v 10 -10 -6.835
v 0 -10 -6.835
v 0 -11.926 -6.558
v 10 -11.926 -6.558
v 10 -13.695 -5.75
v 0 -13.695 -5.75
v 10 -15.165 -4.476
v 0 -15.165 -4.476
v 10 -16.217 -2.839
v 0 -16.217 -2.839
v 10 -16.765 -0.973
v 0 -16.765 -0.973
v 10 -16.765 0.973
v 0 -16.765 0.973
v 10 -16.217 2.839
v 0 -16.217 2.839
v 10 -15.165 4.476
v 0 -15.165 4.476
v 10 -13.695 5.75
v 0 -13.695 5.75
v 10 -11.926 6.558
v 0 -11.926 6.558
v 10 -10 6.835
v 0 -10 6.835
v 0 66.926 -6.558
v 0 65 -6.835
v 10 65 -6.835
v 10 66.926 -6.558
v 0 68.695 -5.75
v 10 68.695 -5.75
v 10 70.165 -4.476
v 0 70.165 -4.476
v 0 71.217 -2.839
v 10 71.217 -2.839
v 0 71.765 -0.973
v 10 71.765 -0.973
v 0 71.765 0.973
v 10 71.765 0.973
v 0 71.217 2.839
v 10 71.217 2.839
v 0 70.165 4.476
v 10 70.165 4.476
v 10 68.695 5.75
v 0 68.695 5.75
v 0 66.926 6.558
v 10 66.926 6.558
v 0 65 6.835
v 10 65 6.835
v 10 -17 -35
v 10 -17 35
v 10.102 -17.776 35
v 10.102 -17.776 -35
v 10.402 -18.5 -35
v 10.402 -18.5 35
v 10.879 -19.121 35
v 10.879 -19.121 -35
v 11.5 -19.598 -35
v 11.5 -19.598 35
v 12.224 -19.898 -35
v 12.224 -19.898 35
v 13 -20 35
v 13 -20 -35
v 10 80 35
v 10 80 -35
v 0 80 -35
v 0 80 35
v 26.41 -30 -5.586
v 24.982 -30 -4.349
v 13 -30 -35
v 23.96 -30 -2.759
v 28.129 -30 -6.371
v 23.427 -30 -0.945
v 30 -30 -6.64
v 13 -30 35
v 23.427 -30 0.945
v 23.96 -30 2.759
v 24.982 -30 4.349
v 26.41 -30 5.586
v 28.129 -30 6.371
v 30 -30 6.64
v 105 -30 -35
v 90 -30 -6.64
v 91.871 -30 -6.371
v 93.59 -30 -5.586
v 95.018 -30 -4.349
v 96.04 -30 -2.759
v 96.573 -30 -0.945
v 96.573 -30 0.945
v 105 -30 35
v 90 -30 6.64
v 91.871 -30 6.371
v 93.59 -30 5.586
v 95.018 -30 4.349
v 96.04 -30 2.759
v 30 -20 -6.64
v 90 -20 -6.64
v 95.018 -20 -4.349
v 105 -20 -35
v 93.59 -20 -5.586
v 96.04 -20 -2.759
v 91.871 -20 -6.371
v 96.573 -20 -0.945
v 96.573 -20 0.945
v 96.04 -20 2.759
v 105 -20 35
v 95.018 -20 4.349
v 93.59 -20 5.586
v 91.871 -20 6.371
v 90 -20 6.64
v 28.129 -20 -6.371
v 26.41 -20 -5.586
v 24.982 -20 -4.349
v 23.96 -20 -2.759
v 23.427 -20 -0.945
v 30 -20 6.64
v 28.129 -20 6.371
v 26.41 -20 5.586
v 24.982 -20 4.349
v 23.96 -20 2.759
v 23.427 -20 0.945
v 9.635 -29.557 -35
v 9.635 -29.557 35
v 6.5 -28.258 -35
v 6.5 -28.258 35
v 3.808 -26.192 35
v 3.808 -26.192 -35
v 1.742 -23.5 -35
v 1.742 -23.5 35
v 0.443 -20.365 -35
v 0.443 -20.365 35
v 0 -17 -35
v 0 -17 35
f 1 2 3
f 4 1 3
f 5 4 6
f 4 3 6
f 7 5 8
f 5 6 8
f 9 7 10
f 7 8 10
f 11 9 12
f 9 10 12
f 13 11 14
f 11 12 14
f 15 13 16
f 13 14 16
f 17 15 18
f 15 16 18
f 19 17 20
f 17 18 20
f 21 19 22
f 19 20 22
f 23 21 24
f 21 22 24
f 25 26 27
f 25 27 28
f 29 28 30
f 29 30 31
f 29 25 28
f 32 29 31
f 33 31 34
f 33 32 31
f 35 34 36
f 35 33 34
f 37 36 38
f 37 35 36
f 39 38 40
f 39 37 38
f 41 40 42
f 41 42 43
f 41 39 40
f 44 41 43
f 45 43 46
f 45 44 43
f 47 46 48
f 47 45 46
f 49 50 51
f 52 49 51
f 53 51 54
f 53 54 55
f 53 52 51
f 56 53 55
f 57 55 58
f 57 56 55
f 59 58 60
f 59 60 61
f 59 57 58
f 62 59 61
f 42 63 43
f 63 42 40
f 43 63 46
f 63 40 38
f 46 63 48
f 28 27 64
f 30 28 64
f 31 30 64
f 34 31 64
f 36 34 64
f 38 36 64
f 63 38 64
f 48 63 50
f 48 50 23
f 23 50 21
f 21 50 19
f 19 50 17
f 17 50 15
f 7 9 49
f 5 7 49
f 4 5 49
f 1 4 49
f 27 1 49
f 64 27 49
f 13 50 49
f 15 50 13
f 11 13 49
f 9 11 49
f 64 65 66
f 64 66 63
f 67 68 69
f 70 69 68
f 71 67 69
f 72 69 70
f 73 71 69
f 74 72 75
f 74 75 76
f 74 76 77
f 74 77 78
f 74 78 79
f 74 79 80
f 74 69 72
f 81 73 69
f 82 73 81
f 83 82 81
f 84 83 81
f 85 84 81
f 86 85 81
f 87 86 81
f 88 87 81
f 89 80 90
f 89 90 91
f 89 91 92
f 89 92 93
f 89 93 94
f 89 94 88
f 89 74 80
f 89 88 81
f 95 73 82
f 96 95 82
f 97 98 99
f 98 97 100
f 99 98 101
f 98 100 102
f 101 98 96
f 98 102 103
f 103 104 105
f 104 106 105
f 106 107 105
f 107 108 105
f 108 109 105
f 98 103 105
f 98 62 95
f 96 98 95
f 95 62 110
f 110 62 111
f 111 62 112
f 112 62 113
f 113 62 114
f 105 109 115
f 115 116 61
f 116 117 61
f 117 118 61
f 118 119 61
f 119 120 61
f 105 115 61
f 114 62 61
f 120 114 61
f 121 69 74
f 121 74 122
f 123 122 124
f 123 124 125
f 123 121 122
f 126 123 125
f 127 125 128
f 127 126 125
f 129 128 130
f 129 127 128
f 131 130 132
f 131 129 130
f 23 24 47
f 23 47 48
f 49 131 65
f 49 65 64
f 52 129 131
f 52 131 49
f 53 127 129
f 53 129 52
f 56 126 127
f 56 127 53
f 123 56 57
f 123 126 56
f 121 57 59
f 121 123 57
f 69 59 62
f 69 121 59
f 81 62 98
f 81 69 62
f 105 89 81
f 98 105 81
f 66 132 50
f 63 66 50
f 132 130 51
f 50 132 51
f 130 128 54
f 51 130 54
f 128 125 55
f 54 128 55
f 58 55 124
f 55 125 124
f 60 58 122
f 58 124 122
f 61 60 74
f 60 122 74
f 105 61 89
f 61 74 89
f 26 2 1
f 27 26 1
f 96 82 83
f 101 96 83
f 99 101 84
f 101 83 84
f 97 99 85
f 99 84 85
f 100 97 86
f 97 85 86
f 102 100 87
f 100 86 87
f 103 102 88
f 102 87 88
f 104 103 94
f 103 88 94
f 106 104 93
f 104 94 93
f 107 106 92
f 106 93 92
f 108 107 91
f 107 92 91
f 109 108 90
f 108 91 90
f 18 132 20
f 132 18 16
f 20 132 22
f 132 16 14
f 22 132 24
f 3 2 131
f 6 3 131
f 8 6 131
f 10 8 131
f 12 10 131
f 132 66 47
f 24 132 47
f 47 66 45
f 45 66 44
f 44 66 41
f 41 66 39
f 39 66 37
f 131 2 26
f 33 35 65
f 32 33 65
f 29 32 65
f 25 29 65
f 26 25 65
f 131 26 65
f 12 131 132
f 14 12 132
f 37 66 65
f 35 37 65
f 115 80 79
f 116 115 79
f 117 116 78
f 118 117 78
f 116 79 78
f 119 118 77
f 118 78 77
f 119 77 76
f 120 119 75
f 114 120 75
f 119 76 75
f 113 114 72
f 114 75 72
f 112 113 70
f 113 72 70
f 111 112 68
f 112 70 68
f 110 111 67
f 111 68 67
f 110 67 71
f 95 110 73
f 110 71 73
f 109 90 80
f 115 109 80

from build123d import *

# Parameters (mm, degrees)
CROQUIS1_W                    = 70
CROQUIS1_H                    = 110
SALIENTE_EXTRUIR1_DEPTH       = 7.9375
CROQUIS2_W                    = 97.0625
CROQUIS2_H                    = 70
SALIENTE_EXTRUIR2_DEPTH       = 7.9375
CONVERTIR_S_LIDO1_START       = -22.0625
CONVERTIR_S_LIDO1_OUTLINE_W   = 97.0625
CONVERTIR_S_LIDO1_OUTLINE_H   = 70
CONVERTIR_S_LIDO1_DEPTH       = 5.0625
CONVERTIR_S_LIDO1_START_2     = -18.37306
CONVERTIR_S_LIDO1_2_OUTLINE_W = 2.0625
CONVERTIR_S_LIDO1_2_OUTLINE_H = 28.16517088
CONVERTIR_S_LIDO1_2_DEPTH     = 98.37306
CONVERTIR_S_LIDO1_START_3     = 65
CONVERTIR_S_LIDO1_3_OUTLINE_W = 2.0625
CONVERTIR_S_LIDO1_3_OUTLINE_H = 13.66965824
CONVERTIR_S_LIDO1_3_DEPTH     = 15
CONVERTIR_S_LIDO1_4_OUTLINE_W = 2.0625
CONVERTIR_S_LIDO1_4_OUTLINE_H = 13.66965824
CONVERTIR_S_LIDO1_4_DEPTH     = 8.37306
CONVERTIR_S_LIDO1_START_4     = 13
CONVERTIR_S_LIDO1_5_OUTLINE_W = 3
CONVERTIR_S_LIDO1_5_OUTLINE_H = 70
CONVERTIR_S_LIDO1_5_DEPTH     = 92
CONVERTIR_S_LIDO1_START_5     = 7.9375
CONVERTIR_S_LIDO1_6_DEPTH     = 2.0625
CONVERTIR_S_LIDO1_START_6     = -35
CONVERTIR_S_LIDO1_7_DEPTH     = 70


with BuildPart() as part:
    # Croquis1 → Saliente-Extruir1 (new body)
    with BuildSketch(Plane(origin=(0, 0, 0), x_dir=(0, 0, -1), z_dir=(1, 0, 0))):
        with Locations((0, 25)):
            Rectangle(CROQUIS1_W, CROQUIS1_H)
        with BuildLine():
            Line((6.83482912, 65), (6.83482912, -10))
            ThreePointArc((6.83482912, -10), (0, -16.83482912), (-6.83482912, -10))
            Line((-6.83482912, -10), (-6.83482912, 65))
            ThreePointArc((-6.83482912, 65), (0, 71.83482912), (6.83482912, 65))
        make_face(mode=Mode.SUBTRACT)
    extrude(amount=SALIENTE_EXTRUIR1_DEPTH)

    # Croquis2 → Saliente-Extruir2 (add)
    with BuildSketch(Plane.XZ.offset(30)):
        with Locations((56.46875, 0)):
            Rectangle(CROQUIS2_W, CROQUIS2_H)
        with BuildLine():
            ThreePointArc((30, -6.640349162), (23.359650838, 0), (30, 6.640349162))
            Line((30, 6.640349162), (90, 6.640349162))
            ThreePointArc((90, 6.640349162), (96.640349162, 0), (90, -6.640349162))
            Line((90, -6.640349162), (30, -6.640349162))
        make_face(mode=Mode.SUBTRACT)
    extrude(amount=-SALIENTE_EXTRUIR2_DEPTH)

    # Convertir-Sólido1: read off the stored shape, not the designer's step
    # Convertir-Sólido1 outline → Convertir-Sólido1 (add)
    with BuildSketch(Plane(origin=(0, 0, 0), x_dir=(1, 0, 0), z_dir=(0, 1, 0)).offset(CONVERTIR_S_LIDO1_START)):
        with Locations((56.46875, 0)):
            Rectangle(CONVERTIR_S_LIDO1_OUTLINE_W, CONVERTIR_S_LIDO1_OUTLINE_H)
        with BuildLine():
            Line((90, -6.640349162), (30, -6.640349162))
            ThreePointArc((30, -6.640349162), (23.359650838, 0), (30, 6.640349162))
            Line((30, 6.640349162), (90, 6.640349162))
            ThreePointArc((90, 6.640349162), (96.640349162, 0), (90, -6.640349162))
        make_face(mode=Mode.SUBTRACT)
    extrude(amount=CONVERTIR_S_LIDO1_DEPTH)

    # Convertir-S_lido1 2 outline → Convertir-S_lido1 2 (add)
    with BuildSketch(Plane(origin=(0, 0, 0), x_dir=(1, 0, 0), z_dir=(0, 1, 0)).offset(CONVERTIR_S_LIDO1_START_2)):
        with Locations((8.96875, 20.91741456)):
            Rectangle(CONVERTIR_S_LIDO1_2_OUTLINE_W, CONVERTIR_S_LIDO1_2_OUTLINE_H)
        with Locations((8.96875, -20.91741456)):
            Rectangle(CONVERTIR_S_LIDO1_2_OUTLINE_W, CONVERTIR_S_LIDO1_2_OUTLINE_H)
    extrude(amount=CONVERTIR_S_LIDO1_2_DEPTH)

    # Convertir-S_lido1 3 outline → Convertir-S_lido1 3 (add)
    with BuildSketch(Plane(origin=(0, 0, 0), x_dir=(1, 0, 0), z_dir=(0, 1, 0)).offset(CONVERTIR_S_LIDO1_START_3)):
        with Locations((8.96875, 0)):
            Rectangle(CONVERTIR_S_LIDO1_3_OUTLINE_W, CONVERTIR_S_LIDO1_3_OUTLINE_H)
    extrude(amount=CONVERTIR_S_LIDO1_3_DEPTH)

    # Convertir-S_lido1 4 outline → Convertir-S_lido1 4 (add)
    with BuildSketch(Plane(origin=(0, 0, 0), x_dir=(1, 0, 0), z_dir=(0, 1, 0)).offset(CONVERTIR_S_LIDO1_START_2)):
        with Locations((8.96875, 0)):
            Rectangle(CONVERTIR_S_LIDO1_4_OUTLINE_W, CONVERTIR_S_LIDO1_4_OUTLINE_H)
    extrude(amount=CONVERTIR_S_LIDO1_4_DEPTH)

    # Convertir-S_lido1 5 outline → Convertir-S_lido1 5 (cut)
    with BuildSketch(Plane.YZ.offset(CONVERTIR_S_LIDO1_START_4)):
        with Locations((-18.5, 0)):
            Rectangle(CONVERTIR_S_LIDO1_5_OUTLINE_W, CONVERTIR_S_LIDO1_5_OUTLINE_H)
    extrude(amount=CONVERTIR_S_LIDO1_5_DEPTH, mode=Mode.SUBTRACT)

    # Convertir-S_lido1 6 outline → Convertir-S_lido1 6 (cut)
    with BuildSketch(Plane.YZ.offset(CONVERTIR_S_LIDO1_START_5)):
        with BuildLine():
            Line((65, 6.83482912), (65, -6.83482912))
            ThreePointArc((65, -6.83482912), (71.83482912, 0), (65, 6.83482912))
        make_face()
        with BuildLine():
            Line((-10, -6.83482912), (-10, 6.83482912))
            ThreePointArc((-10, 6.83482912), (-16.83482912, 0), (-10, -6.83482912))
        make_face()
    extrude(amount=CONVERTIR_S_LIDO1_6_DEPTH, mode=Mode.SUBTRACT)

    # Convertir-S_lido1 7 outline → Convertir-S_lido1 7 (cut)
    with BuildSketch(Plane.XY.offset(CONVERTIR_S_LIDO1_START_6)):
        with BuildLine():
            Line((0, -30), (13, -30))
            ThreePointArc((13, -30), (3.807611845, -26.192388155), (0, -17))
            Line((0, -17), (0, -30))
        make_face()
        with BuildLine():
            ThreePointArc((10, -17), (10.878679656, -19.121320344), (13, -20))
            Line((13, -20), (13, -17))
            Line((13, -17), (10, -17))
        make_face()
    extrude(amount=CONVERTIR_S_LIDO1_7_DEPTH, mode=Mode.SUBTRACT)


solid = part.part
